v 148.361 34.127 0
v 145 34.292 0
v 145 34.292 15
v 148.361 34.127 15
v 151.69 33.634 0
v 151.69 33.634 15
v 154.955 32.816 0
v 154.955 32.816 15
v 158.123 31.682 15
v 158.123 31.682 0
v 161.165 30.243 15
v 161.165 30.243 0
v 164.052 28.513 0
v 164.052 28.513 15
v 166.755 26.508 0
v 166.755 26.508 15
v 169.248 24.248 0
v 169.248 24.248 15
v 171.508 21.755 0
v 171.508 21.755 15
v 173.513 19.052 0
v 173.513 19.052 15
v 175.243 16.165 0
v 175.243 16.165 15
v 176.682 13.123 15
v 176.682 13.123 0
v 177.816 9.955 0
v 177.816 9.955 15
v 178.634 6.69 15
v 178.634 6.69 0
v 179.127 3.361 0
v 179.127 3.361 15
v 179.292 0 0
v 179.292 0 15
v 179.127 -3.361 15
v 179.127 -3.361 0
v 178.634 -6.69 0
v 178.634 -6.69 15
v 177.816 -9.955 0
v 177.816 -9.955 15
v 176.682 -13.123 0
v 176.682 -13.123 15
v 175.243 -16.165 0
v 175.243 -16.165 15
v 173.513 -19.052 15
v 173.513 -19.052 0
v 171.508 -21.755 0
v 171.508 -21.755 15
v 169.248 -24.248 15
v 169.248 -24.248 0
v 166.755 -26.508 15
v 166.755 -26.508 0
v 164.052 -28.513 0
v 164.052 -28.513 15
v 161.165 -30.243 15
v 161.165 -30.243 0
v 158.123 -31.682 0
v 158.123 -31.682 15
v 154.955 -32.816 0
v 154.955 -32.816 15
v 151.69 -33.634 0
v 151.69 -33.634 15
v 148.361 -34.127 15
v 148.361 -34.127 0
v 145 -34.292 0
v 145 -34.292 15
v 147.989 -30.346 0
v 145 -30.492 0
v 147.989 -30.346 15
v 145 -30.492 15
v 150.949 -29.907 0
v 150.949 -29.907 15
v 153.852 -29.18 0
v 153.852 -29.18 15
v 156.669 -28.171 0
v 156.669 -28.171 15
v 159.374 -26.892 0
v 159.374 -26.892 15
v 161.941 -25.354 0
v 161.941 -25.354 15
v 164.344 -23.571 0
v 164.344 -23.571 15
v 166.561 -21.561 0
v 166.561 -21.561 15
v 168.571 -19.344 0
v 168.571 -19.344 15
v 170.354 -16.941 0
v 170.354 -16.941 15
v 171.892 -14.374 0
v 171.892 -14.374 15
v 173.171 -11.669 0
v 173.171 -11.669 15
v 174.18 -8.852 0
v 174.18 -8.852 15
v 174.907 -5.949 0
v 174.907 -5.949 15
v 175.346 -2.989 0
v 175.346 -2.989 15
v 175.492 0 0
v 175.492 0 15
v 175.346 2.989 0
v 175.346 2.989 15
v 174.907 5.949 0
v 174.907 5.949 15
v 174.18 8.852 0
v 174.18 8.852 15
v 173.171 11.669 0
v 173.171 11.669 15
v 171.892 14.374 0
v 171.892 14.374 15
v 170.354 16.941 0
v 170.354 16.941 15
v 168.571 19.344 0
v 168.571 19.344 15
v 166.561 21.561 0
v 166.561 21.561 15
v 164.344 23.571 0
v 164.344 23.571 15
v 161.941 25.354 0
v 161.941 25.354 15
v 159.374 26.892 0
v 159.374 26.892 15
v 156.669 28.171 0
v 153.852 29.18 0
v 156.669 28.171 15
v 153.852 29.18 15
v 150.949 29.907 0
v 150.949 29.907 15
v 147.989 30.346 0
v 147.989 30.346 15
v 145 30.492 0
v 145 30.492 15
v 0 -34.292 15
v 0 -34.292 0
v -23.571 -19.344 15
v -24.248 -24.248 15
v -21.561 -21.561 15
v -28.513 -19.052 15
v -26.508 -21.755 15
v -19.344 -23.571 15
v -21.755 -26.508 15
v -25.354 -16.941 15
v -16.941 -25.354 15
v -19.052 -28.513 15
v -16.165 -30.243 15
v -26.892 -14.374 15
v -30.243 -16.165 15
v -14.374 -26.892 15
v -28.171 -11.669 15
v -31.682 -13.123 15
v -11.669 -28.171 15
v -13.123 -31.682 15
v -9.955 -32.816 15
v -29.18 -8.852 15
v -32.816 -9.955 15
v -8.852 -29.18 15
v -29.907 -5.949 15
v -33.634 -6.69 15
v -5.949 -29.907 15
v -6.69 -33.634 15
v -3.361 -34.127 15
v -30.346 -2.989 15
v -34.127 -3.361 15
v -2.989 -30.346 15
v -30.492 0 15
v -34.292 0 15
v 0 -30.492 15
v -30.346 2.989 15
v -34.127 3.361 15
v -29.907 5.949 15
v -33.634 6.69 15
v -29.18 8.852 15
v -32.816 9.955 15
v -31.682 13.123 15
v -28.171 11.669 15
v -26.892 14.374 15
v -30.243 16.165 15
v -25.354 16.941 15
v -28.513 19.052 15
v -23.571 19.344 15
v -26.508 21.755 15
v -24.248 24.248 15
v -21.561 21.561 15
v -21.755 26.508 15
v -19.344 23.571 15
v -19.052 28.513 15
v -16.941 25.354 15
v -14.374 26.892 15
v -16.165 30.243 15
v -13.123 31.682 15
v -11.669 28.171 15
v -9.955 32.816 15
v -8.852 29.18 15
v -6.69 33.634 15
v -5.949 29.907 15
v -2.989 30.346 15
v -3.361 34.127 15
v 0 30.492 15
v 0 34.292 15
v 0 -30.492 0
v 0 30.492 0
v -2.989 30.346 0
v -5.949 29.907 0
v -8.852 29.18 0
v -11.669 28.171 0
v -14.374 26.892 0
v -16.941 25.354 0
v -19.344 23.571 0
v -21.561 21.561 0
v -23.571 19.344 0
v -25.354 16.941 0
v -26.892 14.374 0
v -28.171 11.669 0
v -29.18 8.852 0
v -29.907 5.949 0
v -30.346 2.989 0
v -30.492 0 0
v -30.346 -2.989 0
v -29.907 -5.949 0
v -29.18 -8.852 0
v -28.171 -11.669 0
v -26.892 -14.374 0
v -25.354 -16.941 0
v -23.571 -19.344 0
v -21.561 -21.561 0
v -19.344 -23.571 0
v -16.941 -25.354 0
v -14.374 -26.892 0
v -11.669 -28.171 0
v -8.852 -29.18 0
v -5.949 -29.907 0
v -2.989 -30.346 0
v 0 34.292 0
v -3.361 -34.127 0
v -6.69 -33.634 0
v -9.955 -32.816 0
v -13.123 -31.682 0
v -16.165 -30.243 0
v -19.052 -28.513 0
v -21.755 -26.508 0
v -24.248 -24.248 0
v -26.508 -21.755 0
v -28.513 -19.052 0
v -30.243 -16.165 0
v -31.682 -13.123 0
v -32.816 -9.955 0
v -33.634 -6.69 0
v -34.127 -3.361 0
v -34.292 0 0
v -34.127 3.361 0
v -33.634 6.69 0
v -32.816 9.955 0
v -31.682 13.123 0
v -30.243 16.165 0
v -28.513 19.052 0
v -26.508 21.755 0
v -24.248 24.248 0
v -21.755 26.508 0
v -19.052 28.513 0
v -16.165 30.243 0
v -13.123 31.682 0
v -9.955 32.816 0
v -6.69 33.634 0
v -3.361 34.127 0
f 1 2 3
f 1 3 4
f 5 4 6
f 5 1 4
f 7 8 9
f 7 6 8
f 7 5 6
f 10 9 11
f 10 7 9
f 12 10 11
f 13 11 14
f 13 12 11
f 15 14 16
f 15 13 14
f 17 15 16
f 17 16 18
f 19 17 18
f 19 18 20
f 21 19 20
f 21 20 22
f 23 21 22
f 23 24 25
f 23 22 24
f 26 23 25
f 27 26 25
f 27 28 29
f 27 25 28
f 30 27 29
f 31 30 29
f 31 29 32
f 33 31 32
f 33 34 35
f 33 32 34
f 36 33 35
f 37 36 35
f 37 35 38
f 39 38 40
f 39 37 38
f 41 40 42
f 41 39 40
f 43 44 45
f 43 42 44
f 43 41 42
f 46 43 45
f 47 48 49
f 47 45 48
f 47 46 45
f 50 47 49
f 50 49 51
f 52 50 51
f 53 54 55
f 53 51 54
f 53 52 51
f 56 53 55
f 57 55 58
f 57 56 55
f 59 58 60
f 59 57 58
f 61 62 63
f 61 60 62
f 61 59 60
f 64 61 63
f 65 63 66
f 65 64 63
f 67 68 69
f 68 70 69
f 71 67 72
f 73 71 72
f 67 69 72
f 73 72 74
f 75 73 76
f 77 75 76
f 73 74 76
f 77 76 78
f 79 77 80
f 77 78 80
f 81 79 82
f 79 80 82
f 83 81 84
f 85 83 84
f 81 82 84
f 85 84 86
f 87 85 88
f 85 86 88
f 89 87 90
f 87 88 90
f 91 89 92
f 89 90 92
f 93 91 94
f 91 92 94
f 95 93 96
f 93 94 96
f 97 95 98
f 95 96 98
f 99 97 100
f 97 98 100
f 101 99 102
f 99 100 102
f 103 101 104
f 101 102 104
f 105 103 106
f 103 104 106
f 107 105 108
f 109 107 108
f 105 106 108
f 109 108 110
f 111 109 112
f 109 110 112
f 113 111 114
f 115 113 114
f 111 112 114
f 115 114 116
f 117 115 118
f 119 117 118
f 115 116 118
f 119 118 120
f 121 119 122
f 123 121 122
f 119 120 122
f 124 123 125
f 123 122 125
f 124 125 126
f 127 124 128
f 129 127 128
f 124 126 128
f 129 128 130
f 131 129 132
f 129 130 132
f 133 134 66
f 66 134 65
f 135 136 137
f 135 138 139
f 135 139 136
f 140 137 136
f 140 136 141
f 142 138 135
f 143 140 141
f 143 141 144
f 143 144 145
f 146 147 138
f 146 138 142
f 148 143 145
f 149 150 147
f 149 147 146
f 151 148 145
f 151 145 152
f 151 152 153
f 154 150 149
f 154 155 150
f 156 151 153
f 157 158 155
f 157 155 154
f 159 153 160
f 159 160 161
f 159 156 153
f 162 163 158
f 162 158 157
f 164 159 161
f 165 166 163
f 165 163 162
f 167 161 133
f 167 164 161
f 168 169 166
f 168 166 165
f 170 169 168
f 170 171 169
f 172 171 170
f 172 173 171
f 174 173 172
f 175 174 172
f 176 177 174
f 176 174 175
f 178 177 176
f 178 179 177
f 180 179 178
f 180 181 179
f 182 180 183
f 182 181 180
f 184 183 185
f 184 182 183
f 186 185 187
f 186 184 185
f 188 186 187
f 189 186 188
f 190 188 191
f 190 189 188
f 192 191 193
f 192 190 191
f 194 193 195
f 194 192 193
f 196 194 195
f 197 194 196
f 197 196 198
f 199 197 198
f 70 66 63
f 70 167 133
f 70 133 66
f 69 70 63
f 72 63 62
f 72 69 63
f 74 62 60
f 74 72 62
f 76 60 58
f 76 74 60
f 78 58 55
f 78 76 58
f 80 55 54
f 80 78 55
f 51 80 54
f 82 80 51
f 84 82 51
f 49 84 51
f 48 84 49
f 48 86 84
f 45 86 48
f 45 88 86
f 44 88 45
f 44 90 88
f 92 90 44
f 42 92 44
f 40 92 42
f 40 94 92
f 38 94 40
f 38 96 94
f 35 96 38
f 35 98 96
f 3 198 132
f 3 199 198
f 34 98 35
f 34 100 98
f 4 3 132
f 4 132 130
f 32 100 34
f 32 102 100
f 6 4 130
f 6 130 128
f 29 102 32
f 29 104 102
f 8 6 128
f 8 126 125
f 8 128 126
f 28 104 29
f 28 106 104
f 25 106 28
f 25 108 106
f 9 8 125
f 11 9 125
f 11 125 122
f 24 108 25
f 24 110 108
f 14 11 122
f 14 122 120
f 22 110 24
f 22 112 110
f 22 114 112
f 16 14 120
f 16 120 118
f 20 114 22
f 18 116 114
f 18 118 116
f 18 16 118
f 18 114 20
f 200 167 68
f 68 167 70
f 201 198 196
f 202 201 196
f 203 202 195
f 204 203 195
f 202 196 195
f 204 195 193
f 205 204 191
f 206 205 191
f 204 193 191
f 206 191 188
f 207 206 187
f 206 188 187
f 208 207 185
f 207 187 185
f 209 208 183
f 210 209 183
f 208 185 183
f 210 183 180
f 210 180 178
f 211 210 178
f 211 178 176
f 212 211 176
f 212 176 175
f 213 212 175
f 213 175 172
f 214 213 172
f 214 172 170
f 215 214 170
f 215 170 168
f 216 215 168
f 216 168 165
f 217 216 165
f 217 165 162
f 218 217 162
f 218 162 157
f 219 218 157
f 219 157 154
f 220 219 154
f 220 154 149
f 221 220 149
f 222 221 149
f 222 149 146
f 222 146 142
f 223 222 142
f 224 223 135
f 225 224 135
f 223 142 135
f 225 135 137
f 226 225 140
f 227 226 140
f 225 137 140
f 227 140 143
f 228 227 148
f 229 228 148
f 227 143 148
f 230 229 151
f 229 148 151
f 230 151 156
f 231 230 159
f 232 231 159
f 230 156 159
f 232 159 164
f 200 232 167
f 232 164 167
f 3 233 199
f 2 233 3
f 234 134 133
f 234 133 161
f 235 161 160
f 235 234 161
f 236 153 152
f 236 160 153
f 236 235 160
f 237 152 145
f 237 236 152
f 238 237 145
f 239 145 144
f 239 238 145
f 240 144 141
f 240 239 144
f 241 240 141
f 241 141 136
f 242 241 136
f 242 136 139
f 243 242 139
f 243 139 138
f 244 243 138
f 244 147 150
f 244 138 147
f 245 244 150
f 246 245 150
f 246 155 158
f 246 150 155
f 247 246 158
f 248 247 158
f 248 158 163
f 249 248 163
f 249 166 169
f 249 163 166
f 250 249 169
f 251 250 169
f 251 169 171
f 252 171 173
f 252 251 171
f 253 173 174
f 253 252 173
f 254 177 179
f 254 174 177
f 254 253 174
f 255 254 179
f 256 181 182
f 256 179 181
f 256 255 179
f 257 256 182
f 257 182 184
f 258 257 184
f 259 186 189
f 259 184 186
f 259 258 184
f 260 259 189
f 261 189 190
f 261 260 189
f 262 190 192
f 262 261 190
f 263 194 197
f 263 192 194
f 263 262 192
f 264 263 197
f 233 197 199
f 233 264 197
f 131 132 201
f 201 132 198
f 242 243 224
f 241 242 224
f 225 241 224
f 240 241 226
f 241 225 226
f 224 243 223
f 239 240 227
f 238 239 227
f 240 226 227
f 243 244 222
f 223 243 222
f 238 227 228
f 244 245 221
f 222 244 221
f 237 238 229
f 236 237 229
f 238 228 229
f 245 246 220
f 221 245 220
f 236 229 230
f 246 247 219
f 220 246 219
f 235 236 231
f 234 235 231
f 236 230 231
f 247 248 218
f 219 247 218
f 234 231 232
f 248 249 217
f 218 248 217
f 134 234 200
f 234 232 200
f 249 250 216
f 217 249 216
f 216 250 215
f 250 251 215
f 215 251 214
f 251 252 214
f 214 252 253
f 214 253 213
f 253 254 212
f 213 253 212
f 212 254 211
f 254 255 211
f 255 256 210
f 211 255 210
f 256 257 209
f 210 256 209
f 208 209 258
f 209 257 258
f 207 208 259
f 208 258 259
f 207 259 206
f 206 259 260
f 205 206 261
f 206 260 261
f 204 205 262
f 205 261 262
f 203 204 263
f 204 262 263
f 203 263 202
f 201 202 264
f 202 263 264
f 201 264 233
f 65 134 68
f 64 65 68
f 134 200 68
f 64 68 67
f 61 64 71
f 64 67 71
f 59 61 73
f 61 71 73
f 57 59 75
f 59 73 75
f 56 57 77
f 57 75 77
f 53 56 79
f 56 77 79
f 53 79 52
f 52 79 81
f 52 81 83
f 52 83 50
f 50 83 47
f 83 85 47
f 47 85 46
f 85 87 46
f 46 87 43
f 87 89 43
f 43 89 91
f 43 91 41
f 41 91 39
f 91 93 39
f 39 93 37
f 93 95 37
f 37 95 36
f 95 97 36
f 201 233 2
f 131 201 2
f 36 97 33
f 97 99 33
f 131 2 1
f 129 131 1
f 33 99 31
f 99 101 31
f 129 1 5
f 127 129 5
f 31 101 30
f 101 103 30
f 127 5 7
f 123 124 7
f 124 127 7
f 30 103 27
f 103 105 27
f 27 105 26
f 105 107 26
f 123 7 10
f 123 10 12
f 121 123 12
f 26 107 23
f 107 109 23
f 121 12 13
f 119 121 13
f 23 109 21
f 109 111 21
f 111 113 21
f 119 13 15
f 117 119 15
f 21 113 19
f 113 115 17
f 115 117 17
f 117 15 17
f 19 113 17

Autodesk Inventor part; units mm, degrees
ref_plane "YZ Plane" through (0, 0, 0) normal (1, 0, 0) x (0, 1, 0)
ref_plane "XZ Plane" through (0, 0, 0) normal (0, 1, 0) x (-1, 0, 0)
ref_plane "XY Plane" through (0, 0, 0) normal (0, 0, 1) x (1, 0, 0)
sketch "BeltOuterProfile" plane through (0, 0, 0) normal (0, 0, 1) x (1, 0, 0)
  arc A0 (0, 34.2925) -> (0, -34.2925) centre (0, 0) ccw
  arc A1 (145, -34.2925) -> (145, 34.2925) centre (145, 0) ccw
  line L0 (0, 34.2925) -> (145, 34.2925)
  line L1 (0, -34.2925) -> (145, -34.2925)
  line L2 (0, 0) -> (500, 0) construction
  line L3 (145, 34.2925) -> (145, 0) construction
  line L4 (145, 0) -> (145, -34.2925) construction
  line L5 (0, 0) -> (0, 34.2925) construction
  line L6 (0, 0) -> (0, -34.2925) construction
  dimension "BeltLength" = 500
  dimension "CenterDistance" = 145
  dimension "d24" = 34.2925
  dimension "d25" = 34.2925
extrude "BeltWidth" add sketch "BeltOuterProfile" along normal blind 15
sketch "BeltThickness" plane through (0, 0, 15) normal (0, 0, 1) x (1, 0, 0)
  arc A0 (0, 34.2925) -> (0, -34.2925) centre (0, 0) ccw projected
  line L0 (0, -34.2925) -> (145, -34.2925) projected
  arc A1 (145, -34.2925) -> (145, 34.2925) centre (145, 0) ccw projected
  line L1 (145, 34.2925) -> (0, 34.2925) projected
  arc A2 (0, 30.4925) -> (0, -30.4925) centre (0, 0) ccw
  line L2 (0, -30.4925) -> (145, -30.4925)
  arc A3 (145, -30.4925) -> (145, 30.4925) centre (145, 0) ccw
  line L3 (145, 30.4925) -> (0, 30.4925)
  dimension "d17" = 3.8
extrude "BeltInternalAreaCut" cut sketch "BeltThickness" against normal through all contours L3 A3 L2 A2
equation "\"Pulley1WrapLength\" = 1"
equation "\"Pulley2WrapLength\" = 1"
properties part number "Belt Calculator" material "Nylon 6/6"
